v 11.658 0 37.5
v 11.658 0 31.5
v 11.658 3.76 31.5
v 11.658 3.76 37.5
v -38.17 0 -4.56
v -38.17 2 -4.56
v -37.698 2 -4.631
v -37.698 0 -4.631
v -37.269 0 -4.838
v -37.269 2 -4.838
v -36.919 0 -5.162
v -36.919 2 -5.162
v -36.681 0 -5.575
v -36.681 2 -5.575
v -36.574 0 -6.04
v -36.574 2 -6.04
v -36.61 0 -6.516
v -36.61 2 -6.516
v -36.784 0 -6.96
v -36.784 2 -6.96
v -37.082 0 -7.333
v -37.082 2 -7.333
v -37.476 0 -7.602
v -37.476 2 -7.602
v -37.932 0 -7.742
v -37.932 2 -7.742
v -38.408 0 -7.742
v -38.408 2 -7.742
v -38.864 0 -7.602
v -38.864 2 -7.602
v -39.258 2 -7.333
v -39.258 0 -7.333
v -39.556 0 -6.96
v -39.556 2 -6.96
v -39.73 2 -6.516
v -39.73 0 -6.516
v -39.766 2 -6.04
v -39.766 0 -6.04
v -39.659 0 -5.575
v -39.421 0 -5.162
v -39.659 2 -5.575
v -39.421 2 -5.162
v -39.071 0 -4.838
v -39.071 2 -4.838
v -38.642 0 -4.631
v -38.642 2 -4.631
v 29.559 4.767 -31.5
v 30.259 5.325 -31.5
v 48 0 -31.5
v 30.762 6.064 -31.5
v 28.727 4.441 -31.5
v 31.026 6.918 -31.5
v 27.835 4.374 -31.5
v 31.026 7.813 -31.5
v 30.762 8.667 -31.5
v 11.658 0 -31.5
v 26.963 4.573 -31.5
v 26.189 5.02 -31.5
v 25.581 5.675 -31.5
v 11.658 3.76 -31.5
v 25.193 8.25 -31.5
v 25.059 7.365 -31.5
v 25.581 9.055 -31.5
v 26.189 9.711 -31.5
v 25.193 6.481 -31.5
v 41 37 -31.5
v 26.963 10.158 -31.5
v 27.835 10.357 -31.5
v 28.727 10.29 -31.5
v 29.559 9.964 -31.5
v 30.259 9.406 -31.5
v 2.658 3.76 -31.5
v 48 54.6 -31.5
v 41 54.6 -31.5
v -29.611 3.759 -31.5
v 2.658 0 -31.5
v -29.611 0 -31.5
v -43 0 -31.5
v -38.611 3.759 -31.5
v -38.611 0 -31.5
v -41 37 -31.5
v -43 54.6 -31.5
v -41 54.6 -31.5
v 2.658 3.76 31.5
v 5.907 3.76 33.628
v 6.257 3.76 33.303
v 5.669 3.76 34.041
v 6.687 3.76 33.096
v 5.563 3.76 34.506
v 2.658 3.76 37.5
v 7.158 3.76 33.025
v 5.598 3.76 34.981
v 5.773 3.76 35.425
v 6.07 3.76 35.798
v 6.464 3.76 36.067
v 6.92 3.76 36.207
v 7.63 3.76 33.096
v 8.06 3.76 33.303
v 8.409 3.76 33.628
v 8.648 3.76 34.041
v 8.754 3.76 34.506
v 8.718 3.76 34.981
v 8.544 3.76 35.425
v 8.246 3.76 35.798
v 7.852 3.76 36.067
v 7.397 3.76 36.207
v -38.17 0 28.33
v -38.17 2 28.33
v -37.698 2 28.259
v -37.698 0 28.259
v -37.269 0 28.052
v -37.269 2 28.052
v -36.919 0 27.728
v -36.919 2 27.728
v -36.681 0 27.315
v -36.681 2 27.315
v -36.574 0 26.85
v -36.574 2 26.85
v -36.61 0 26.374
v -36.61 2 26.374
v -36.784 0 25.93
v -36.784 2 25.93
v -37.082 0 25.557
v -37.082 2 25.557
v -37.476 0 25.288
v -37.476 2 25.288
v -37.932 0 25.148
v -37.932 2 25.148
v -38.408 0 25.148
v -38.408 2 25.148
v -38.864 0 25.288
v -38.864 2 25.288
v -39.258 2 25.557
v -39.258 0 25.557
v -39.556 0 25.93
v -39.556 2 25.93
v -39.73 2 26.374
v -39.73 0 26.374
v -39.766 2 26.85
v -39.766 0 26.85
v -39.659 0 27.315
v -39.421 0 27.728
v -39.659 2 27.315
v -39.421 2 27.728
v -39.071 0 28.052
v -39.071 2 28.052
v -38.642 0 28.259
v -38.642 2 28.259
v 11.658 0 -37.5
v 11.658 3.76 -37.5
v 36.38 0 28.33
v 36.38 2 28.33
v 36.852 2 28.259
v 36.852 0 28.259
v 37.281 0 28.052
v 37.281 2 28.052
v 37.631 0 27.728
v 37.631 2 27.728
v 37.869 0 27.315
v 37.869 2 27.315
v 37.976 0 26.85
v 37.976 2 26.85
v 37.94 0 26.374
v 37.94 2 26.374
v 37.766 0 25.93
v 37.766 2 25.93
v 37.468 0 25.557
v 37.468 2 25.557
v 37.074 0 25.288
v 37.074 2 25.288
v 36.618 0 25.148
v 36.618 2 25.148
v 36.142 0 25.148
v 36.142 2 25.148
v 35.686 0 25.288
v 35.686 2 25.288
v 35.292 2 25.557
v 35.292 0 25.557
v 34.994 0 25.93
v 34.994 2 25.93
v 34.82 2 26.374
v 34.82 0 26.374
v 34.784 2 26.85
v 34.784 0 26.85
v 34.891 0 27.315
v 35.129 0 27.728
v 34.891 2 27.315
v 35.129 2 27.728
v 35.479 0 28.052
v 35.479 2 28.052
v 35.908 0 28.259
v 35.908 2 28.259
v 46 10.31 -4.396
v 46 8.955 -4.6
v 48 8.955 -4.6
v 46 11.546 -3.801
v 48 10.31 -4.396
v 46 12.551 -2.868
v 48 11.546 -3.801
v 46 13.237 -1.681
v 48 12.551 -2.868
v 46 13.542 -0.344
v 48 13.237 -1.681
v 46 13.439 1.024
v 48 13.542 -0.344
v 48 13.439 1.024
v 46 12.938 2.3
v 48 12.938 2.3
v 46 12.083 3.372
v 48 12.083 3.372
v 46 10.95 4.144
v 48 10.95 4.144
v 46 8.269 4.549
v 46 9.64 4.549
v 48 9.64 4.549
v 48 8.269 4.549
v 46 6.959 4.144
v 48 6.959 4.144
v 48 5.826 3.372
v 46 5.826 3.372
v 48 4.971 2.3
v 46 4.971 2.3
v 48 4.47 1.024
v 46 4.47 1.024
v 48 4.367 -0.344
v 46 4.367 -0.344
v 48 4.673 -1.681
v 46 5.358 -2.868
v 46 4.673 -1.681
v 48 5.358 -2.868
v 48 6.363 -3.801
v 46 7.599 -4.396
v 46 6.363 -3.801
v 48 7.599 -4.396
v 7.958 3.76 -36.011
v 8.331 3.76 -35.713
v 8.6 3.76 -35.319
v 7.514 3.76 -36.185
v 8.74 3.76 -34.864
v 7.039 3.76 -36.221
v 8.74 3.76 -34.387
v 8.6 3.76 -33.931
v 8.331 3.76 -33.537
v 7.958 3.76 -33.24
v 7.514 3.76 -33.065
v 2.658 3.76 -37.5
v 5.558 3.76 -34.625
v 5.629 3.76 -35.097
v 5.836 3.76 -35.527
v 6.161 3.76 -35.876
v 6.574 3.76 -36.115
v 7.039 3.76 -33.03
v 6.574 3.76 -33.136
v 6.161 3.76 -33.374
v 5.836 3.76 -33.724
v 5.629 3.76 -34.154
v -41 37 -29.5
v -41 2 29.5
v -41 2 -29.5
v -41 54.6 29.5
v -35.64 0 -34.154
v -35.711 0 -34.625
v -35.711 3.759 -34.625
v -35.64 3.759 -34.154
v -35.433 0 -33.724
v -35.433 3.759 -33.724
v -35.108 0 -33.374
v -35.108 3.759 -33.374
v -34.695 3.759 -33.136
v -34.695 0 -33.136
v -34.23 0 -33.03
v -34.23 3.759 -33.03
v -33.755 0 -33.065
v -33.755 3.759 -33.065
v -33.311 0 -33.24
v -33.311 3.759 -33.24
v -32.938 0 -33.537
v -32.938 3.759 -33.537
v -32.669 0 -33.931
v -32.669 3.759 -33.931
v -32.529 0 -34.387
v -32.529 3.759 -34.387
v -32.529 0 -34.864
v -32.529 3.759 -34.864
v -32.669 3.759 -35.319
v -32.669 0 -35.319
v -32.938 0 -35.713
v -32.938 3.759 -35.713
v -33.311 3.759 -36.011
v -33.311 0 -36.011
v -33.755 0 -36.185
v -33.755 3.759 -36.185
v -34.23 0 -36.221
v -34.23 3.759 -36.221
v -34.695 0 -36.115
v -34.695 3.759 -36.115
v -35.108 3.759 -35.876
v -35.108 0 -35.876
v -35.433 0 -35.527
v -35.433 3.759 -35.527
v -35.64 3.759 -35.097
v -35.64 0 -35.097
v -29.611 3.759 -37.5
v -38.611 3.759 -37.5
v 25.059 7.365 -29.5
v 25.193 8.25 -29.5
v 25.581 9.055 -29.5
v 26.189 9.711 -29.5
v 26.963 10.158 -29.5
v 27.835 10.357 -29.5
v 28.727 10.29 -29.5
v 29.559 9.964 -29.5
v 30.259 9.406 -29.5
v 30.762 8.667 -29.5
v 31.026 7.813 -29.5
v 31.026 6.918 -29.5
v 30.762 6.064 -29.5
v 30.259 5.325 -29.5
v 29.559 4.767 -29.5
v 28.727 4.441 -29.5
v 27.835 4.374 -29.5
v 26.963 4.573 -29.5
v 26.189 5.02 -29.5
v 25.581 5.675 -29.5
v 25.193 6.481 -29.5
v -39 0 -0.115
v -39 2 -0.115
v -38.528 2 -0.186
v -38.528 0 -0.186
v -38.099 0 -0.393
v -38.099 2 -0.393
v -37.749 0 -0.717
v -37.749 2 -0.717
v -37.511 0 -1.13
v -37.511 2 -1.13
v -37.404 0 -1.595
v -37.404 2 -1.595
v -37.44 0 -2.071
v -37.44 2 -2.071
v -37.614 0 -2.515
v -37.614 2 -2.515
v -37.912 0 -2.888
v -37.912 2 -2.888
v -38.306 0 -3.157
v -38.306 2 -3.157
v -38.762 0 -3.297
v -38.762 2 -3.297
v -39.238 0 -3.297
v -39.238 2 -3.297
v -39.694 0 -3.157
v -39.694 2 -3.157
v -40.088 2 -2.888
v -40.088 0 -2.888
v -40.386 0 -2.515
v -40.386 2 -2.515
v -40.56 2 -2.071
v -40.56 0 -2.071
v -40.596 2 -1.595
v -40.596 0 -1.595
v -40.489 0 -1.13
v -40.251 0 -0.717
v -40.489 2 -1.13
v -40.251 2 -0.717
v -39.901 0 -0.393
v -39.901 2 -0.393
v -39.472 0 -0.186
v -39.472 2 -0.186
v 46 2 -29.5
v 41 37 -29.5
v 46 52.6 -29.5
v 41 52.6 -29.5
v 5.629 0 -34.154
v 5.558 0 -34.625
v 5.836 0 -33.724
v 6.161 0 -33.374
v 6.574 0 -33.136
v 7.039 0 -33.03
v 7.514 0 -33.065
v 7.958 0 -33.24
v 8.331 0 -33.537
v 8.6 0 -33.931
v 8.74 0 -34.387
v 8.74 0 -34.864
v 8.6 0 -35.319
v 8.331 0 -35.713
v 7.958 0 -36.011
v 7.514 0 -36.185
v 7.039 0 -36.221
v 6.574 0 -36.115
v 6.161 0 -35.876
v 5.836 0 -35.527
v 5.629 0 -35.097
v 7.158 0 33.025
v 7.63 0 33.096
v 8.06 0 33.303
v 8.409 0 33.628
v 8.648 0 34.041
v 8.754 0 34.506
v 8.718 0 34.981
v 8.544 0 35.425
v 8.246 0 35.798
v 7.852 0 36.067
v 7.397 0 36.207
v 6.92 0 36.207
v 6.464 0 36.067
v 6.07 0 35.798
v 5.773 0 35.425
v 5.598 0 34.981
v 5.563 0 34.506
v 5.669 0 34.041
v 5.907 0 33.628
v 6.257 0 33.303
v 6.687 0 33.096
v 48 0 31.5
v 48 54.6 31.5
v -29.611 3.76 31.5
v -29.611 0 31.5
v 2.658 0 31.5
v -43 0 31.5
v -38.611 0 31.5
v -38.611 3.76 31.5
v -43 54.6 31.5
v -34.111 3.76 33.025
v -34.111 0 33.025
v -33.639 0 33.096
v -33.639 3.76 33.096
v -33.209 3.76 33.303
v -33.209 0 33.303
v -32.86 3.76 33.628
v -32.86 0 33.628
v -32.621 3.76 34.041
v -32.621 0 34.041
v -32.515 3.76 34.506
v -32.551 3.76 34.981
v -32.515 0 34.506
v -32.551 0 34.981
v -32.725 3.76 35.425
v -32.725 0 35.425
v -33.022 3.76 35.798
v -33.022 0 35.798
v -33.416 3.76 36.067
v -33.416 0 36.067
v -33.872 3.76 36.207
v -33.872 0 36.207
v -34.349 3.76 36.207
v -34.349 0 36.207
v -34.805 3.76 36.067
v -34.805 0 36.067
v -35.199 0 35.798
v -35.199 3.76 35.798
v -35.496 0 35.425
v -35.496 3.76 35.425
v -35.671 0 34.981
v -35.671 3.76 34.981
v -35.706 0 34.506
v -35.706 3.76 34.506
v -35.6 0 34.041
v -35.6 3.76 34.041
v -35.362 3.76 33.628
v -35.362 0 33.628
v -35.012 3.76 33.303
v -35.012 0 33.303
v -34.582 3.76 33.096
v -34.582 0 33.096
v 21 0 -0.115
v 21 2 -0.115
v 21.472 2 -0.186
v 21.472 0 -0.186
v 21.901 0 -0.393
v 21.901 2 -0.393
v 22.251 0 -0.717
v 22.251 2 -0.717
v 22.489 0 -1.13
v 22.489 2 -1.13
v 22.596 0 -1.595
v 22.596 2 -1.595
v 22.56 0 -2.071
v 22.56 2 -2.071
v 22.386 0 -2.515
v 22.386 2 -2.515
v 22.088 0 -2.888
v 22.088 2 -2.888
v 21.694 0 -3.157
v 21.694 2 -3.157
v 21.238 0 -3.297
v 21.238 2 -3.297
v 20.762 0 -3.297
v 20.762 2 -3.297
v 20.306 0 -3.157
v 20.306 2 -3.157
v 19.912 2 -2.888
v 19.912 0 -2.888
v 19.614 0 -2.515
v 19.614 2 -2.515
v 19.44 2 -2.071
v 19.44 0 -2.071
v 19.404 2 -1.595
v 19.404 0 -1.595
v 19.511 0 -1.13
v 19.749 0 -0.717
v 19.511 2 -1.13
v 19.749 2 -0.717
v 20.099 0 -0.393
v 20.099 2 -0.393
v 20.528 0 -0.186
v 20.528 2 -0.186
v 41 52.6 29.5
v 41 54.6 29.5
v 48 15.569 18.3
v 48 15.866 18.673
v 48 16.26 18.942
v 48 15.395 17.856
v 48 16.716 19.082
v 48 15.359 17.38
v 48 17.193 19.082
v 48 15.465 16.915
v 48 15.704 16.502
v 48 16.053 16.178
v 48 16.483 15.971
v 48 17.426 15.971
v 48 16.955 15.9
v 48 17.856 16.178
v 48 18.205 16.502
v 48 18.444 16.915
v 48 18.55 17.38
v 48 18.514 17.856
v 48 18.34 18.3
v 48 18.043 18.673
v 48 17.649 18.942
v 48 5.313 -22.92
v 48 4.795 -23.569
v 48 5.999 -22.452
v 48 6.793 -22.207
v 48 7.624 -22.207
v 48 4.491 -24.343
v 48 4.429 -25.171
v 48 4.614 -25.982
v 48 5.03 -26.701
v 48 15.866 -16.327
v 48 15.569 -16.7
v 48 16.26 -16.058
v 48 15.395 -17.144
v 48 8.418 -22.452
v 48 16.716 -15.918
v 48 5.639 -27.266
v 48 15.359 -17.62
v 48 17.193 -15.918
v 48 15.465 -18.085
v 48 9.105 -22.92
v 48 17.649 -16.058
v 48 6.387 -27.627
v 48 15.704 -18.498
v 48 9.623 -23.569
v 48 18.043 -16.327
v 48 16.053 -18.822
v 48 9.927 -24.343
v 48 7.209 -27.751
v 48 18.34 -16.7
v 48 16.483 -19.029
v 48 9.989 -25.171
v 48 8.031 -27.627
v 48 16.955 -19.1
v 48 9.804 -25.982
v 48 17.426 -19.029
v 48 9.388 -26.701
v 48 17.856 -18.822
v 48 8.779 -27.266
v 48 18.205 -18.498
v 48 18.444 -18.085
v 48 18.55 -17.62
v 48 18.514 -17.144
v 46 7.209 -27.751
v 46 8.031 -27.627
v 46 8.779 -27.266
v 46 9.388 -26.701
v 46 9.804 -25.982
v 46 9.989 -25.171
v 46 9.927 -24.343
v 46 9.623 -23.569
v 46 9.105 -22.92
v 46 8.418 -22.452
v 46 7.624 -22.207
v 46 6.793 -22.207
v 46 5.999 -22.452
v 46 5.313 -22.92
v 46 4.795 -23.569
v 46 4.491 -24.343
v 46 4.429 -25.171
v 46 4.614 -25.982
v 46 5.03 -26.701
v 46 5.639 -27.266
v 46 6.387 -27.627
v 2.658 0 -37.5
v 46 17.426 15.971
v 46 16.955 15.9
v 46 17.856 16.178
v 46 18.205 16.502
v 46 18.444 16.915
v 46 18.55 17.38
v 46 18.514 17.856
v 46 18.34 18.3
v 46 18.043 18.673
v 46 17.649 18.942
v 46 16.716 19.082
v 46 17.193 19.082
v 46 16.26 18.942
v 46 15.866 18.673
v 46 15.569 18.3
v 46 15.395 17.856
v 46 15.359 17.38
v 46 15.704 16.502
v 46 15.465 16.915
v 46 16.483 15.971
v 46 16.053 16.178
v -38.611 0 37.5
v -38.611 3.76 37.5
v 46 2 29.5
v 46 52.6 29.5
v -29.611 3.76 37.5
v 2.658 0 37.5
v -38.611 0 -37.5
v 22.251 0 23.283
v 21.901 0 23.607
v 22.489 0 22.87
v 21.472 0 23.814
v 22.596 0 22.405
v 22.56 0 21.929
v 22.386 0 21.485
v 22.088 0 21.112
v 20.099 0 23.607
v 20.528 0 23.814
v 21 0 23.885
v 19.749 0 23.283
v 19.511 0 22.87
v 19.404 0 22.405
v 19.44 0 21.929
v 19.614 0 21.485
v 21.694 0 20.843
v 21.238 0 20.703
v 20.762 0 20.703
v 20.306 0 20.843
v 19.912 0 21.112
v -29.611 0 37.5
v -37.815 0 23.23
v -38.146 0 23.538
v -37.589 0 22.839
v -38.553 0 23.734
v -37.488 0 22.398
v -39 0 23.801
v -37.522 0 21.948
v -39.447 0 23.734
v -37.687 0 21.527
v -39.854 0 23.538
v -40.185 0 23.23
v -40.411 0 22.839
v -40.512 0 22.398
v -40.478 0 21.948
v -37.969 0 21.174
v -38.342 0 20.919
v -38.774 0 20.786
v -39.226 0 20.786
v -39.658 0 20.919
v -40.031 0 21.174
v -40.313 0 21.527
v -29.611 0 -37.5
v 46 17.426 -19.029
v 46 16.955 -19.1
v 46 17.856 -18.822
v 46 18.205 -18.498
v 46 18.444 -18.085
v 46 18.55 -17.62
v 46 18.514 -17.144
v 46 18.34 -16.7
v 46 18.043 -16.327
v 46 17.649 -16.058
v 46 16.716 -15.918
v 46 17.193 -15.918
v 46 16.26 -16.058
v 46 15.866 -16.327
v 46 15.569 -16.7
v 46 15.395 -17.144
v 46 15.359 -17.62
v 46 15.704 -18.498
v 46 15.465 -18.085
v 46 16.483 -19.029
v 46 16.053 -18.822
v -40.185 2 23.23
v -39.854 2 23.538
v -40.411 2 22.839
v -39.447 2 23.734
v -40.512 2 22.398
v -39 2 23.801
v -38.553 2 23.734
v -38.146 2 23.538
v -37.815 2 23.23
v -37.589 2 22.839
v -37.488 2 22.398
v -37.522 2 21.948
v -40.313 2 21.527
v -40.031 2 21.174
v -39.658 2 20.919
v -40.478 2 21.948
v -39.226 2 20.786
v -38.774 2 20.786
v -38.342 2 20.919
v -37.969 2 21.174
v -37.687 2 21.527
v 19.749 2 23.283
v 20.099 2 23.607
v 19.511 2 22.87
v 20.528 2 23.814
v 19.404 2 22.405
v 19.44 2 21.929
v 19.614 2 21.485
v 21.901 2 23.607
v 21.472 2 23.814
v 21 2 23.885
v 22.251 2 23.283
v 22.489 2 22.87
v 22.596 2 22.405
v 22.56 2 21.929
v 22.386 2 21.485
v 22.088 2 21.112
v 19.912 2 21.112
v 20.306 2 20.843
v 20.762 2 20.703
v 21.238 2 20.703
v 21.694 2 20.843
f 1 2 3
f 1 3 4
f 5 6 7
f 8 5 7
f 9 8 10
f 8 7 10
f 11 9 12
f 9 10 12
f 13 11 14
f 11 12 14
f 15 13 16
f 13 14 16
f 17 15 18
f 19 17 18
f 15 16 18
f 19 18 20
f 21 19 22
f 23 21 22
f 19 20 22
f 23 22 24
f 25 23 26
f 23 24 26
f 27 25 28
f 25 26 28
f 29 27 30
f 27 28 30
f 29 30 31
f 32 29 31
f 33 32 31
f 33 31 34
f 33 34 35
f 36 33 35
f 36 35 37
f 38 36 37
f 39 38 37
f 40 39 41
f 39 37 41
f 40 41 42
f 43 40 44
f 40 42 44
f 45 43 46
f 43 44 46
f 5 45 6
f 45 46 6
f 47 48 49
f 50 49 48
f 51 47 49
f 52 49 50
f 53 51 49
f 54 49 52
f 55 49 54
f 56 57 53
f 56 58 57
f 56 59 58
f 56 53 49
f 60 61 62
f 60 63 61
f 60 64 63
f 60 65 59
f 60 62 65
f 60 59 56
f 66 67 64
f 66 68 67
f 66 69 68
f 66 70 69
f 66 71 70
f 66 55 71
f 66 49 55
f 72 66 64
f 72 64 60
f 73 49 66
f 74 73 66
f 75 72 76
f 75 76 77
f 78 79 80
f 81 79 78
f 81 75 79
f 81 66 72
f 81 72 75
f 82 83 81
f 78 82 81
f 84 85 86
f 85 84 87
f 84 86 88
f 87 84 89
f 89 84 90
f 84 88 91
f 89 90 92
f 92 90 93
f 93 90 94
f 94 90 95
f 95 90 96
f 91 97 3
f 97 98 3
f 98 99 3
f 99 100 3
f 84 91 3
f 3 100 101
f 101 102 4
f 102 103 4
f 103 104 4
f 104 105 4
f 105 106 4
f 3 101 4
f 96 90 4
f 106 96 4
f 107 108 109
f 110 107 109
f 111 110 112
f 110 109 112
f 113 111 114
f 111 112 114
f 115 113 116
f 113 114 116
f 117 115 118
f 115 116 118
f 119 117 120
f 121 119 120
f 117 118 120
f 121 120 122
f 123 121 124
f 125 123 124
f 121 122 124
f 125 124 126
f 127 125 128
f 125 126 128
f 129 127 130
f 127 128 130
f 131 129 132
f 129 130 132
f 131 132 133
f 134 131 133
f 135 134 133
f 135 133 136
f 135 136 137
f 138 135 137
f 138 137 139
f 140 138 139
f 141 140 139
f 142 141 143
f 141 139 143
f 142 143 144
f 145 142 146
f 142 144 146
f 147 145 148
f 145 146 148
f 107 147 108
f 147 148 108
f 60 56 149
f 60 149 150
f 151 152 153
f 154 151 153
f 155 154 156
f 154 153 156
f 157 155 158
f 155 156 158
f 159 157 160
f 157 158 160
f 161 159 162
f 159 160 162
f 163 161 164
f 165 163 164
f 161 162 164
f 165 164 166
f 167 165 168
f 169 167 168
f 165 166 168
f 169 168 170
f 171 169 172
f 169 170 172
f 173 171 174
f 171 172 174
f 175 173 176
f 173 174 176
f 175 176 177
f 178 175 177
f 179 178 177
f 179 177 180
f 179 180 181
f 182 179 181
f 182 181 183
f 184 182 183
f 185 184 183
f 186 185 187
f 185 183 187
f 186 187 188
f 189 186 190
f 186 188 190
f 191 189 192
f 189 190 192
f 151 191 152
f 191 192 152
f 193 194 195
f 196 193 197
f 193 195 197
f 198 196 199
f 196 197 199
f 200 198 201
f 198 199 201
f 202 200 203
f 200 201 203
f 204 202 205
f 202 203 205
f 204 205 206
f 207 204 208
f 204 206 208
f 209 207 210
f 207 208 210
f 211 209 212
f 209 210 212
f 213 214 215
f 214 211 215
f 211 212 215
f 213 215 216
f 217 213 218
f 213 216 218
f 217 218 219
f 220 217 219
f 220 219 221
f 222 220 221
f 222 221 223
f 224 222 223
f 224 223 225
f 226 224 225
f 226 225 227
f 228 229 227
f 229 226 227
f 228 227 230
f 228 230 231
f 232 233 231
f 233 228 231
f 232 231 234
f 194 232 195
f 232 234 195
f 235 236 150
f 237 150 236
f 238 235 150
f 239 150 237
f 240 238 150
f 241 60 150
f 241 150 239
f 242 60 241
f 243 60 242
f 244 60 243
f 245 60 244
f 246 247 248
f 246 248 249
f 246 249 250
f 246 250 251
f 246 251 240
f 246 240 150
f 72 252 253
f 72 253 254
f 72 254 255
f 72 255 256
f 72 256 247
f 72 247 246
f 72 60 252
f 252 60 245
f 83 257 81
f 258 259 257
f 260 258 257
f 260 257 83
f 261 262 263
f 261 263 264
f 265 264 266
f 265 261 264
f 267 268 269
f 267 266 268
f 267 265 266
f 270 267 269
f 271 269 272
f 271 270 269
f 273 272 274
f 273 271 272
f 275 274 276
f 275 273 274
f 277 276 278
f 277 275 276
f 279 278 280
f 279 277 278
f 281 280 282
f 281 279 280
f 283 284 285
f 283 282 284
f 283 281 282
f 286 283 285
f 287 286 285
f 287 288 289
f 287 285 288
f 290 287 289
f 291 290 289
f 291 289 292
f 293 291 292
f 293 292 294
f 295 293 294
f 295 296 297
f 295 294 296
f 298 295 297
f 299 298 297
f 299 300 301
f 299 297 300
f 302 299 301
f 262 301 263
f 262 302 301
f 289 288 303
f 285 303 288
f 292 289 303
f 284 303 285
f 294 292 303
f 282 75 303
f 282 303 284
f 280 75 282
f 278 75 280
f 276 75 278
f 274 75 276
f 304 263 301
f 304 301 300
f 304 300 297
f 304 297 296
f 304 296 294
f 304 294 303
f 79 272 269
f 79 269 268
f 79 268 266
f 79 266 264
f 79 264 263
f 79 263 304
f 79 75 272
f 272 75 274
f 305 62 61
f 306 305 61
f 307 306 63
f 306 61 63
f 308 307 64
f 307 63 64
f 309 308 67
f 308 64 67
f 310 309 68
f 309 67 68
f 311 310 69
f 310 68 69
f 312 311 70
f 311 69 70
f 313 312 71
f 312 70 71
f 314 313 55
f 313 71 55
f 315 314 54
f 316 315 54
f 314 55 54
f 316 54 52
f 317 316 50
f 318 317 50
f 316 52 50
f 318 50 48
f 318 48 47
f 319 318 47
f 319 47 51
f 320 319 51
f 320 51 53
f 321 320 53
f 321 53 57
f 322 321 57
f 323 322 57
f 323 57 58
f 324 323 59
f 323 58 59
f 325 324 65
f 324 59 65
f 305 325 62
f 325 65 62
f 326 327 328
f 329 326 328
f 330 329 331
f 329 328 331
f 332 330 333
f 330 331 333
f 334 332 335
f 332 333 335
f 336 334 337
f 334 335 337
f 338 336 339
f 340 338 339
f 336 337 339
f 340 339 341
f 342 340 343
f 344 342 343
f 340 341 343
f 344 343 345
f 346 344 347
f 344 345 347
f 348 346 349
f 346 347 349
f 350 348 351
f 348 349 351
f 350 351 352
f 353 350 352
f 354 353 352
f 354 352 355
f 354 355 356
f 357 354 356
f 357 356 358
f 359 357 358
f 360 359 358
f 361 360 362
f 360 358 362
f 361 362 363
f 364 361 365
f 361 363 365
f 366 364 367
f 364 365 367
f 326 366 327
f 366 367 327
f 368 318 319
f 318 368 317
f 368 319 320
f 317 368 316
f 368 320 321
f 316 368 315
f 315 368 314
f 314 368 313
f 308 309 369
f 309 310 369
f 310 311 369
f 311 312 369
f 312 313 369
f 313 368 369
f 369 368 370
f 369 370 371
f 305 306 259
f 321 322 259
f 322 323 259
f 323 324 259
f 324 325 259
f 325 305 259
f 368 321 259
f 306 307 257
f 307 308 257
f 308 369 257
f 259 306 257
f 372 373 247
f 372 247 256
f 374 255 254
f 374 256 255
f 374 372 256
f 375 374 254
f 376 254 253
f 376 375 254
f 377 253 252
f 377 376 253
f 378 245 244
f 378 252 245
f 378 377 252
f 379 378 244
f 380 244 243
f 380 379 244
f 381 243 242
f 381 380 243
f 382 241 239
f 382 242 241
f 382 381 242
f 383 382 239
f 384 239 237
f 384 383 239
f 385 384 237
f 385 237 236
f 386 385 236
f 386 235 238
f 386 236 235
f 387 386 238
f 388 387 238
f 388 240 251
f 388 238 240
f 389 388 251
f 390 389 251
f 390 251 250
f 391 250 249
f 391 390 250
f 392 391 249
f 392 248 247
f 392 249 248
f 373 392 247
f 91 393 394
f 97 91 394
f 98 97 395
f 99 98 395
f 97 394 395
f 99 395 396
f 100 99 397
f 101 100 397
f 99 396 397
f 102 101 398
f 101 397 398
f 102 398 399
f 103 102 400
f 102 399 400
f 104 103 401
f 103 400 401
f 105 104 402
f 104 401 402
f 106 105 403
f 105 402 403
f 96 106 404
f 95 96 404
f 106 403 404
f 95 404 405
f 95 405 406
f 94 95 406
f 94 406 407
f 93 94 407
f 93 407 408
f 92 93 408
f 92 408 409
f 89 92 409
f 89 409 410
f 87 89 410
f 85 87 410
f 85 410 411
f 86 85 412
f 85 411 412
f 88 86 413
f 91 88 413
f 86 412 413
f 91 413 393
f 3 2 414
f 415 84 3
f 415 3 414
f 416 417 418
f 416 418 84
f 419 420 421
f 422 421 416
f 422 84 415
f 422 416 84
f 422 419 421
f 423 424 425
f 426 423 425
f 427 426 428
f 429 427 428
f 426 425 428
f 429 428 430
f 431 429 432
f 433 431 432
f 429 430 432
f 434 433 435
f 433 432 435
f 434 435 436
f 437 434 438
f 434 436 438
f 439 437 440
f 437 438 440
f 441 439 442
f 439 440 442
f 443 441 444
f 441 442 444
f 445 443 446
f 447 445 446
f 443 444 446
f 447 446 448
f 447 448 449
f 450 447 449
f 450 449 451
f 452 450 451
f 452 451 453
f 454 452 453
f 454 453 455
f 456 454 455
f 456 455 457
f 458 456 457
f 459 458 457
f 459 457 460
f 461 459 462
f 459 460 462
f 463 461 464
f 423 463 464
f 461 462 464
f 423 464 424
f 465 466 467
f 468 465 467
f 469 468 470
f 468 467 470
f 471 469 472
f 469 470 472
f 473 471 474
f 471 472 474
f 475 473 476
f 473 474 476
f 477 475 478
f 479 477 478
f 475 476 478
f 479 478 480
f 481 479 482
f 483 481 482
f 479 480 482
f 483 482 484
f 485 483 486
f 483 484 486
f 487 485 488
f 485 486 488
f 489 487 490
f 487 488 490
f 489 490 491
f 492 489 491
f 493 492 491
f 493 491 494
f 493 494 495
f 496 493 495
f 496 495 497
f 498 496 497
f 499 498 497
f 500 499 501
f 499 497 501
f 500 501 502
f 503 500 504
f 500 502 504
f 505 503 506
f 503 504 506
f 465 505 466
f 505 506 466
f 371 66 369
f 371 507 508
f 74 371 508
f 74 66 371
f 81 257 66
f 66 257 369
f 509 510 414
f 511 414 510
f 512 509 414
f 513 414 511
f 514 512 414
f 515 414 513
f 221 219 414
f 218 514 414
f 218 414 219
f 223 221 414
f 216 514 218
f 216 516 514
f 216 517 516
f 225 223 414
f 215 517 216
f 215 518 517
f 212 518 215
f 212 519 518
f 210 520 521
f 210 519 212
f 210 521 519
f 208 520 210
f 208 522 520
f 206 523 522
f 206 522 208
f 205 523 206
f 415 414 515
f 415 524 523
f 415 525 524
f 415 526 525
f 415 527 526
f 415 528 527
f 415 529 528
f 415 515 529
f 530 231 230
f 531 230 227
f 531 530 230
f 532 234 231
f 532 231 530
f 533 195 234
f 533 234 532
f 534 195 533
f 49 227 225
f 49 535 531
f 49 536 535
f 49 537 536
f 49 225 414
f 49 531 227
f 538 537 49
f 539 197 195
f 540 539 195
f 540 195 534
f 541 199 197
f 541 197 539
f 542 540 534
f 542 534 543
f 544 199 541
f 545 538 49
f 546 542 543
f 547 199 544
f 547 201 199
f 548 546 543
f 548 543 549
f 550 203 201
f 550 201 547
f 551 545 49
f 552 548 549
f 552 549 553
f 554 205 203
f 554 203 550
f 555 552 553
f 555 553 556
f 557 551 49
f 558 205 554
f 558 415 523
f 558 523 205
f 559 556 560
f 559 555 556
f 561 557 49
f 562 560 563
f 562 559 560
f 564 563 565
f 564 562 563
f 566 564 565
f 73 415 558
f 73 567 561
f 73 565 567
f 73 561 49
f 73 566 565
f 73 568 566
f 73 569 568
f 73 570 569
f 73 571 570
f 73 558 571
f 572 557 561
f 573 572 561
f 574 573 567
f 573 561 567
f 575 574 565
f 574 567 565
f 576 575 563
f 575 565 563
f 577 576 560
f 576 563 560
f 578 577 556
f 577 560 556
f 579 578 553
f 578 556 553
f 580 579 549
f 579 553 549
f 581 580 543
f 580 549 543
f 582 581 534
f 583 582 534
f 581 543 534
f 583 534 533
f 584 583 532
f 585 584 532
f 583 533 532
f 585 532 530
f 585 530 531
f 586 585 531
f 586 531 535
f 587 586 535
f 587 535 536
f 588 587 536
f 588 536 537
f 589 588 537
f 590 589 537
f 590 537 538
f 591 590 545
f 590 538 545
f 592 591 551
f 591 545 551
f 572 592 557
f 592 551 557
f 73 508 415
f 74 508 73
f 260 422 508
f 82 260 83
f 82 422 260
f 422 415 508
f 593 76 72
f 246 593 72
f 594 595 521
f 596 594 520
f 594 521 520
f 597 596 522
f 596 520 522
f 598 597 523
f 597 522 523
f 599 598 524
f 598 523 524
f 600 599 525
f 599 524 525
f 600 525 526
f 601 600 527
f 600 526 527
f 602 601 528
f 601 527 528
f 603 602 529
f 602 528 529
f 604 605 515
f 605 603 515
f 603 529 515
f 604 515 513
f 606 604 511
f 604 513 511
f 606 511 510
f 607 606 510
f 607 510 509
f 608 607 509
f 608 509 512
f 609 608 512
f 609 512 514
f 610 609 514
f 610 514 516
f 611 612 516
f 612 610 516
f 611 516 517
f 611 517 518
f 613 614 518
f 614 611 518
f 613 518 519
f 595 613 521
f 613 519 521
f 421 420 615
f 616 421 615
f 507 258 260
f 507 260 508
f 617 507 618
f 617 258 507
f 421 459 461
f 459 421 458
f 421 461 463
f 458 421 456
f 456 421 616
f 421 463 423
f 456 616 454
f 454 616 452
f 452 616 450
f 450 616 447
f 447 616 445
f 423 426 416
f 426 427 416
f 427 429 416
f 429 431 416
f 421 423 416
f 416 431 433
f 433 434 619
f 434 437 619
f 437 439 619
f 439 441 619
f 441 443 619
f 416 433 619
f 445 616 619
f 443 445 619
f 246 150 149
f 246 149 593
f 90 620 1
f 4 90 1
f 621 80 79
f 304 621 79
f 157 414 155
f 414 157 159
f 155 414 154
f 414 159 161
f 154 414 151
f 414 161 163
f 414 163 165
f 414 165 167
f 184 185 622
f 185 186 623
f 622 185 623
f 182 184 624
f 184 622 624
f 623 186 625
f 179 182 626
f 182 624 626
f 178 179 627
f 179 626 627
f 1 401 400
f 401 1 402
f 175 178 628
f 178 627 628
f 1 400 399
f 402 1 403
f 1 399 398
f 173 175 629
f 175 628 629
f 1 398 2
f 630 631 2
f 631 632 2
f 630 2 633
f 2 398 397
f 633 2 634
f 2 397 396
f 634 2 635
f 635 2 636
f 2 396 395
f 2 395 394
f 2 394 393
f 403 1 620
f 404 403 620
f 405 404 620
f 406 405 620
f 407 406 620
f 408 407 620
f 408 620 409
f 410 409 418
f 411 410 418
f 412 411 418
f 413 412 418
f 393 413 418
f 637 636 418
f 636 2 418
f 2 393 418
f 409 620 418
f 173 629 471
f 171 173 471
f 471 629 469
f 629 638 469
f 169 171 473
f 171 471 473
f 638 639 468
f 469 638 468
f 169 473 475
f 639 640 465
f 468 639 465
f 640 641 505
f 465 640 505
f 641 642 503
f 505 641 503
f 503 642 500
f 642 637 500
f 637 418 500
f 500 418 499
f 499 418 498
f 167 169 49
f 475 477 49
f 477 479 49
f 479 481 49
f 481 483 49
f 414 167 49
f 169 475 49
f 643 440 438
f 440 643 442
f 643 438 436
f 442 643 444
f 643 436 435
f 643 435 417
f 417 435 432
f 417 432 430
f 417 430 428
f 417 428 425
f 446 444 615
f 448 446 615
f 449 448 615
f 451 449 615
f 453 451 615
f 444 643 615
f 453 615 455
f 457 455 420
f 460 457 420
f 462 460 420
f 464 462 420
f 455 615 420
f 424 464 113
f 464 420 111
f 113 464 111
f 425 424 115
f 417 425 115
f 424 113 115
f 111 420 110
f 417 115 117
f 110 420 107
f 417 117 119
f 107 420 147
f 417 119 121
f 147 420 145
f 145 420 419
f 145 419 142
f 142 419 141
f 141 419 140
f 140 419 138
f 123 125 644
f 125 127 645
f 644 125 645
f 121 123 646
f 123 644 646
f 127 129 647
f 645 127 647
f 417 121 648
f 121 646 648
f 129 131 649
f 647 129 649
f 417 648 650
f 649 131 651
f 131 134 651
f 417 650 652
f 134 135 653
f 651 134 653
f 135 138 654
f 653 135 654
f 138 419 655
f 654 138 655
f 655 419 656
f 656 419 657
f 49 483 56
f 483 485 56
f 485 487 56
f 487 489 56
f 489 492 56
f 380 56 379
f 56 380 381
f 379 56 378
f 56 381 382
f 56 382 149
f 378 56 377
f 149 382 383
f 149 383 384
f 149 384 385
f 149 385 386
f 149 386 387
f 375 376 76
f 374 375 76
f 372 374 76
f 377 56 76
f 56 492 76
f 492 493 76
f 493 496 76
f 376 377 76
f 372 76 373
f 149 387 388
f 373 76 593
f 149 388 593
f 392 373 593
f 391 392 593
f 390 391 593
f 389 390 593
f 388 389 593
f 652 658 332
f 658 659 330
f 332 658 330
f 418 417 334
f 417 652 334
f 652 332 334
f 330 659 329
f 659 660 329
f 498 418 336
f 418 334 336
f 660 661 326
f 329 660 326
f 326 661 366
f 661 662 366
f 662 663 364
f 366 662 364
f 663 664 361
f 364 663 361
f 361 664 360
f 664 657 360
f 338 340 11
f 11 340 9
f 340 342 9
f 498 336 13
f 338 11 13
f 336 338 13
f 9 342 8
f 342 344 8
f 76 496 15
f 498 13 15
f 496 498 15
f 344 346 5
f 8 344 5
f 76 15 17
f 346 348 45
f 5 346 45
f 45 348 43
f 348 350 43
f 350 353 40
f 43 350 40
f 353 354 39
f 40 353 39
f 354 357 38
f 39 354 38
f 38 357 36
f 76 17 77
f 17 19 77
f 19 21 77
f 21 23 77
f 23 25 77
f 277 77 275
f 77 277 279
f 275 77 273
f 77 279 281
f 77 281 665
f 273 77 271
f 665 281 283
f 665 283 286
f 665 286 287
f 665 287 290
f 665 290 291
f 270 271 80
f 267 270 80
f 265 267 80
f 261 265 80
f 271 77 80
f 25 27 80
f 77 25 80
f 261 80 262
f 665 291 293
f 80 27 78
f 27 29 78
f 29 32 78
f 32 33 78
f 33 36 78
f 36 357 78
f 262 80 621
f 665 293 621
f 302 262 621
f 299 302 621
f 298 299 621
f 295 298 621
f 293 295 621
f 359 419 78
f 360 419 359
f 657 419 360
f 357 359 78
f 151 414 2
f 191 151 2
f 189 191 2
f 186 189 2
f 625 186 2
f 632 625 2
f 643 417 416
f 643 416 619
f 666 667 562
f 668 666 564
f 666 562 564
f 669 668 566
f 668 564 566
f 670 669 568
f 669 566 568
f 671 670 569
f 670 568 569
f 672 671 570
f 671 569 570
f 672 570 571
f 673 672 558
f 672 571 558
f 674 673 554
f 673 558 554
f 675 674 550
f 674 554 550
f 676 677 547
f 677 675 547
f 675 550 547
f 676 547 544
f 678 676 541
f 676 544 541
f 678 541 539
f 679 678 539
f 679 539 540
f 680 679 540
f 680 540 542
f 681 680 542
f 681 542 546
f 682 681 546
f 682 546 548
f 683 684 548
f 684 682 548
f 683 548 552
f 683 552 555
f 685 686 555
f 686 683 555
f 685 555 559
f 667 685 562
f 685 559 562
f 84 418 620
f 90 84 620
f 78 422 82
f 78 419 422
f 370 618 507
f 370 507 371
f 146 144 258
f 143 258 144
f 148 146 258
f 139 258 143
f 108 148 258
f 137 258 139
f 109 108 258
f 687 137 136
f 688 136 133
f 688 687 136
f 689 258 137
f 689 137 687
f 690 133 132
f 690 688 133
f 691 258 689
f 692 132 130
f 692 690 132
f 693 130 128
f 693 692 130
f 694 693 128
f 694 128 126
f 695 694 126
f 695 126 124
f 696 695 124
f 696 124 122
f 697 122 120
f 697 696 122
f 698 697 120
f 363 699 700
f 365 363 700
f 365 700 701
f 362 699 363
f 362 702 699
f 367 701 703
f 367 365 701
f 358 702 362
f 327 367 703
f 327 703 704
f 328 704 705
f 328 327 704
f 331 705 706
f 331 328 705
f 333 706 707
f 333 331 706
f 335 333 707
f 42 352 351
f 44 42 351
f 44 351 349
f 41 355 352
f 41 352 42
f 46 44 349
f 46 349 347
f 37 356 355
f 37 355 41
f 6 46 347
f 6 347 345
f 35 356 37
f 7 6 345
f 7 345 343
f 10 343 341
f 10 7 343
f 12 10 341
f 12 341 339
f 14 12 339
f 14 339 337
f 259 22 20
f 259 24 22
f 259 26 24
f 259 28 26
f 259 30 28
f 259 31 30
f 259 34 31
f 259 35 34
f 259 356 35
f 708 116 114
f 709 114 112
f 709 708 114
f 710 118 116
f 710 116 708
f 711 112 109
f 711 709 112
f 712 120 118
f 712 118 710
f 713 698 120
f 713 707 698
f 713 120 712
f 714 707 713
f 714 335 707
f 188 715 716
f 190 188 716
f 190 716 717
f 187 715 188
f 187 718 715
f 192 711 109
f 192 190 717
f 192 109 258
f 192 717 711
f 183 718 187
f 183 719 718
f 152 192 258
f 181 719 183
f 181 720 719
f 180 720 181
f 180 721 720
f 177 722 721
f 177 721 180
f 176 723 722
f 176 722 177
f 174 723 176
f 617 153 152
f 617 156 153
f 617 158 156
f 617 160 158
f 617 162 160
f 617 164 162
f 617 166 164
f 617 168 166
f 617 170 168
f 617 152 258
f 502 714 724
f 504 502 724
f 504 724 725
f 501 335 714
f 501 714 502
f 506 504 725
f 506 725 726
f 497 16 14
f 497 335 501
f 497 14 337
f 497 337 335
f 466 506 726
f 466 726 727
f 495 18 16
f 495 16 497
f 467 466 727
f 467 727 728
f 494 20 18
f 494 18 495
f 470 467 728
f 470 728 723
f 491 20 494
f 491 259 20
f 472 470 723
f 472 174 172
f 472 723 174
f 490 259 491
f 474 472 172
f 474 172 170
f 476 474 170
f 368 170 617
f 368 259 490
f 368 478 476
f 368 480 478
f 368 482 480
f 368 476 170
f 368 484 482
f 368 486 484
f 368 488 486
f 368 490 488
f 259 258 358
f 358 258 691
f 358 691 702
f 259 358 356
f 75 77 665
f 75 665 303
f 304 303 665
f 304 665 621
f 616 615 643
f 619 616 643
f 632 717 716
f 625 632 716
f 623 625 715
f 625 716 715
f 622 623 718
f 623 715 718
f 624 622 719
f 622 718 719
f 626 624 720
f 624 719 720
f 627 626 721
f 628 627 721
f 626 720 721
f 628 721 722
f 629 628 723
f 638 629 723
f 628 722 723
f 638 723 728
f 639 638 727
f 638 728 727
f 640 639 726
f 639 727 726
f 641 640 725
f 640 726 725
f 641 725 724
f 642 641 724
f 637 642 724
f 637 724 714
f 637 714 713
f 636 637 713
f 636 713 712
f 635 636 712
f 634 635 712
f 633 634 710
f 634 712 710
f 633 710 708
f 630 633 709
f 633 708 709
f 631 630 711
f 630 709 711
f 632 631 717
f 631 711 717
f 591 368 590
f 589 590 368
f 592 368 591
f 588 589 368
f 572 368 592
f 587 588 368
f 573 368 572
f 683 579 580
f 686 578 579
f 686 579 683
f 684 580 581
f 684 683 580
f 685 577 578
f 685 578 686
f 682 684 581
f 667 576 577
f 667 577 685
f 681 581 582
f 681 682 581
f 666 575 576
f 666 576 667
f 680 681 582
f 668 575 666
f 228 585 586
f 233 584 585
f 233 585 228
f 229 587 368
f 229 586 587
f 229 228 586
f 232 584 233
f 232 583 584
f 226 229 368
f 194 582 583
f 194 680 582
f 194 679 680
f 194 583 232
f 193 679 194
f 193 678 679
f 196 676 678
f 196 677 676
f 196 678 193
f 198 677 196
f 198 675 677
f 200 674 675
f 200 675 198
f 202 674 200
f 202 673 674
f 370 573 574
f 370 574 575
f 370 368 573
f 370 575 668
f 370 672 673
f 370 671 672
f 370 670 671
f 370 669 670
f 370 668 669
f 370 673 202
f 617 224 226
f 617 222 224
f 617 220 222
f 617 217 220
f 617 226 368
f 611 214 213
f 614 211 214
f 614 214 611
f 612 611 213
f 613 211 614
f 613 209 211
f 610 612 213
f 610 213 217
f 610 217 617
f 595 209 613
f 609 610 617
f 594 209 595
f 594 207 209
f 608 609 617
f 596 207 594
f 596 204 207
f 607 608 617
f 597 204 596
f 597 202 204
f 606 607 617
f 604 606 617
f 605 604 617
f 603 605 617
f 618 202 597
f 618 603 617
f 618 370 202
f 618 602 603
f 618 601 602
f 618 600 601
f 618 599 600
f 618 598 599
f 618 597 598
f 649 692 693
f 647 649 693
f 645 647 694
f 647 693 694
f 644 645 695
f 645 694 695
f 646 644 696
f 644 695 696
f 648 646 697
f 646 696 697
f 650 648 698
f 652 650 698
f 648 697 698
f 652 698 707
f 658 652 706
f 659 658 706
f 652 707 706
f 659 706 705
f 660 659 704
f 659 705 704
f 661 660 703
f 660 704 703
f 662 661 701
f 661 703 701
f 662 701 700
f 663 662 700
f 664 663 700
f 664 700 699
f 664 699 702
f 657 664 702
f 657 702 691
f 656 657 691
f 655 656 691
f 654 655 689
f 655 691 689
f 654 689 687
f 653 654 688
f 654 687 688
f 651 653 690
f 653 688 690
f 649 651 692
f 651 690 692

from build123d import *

# Parameters (mm, degrees)
SKETCH_1_W                = 86
SKETCH_1_H                = 63
EXTRUDE_1_DEPTH           = 2
SKETCH_2_W                = 86
SKETCH_2_H                = 63
SKETCH_2_W_2              = 82
SKETCH_2_H_2              = 59
EXTRUDE_3_DEPTH           = 52.6
SKETCH_4_W                = 82
SKETCH_4_H                = 17.6
CUT_EXTRUDE_1_DEPTH       = 52.6
SKETCH_5_R                = 1.6
SKETCH_5_R_2              = 4.6
CUT_EXTRUDE_2_DEPTH       = 2
SKETCH_7_R                = 1.6
CUT_EXTRUDE_6_DEPTH       = 2
SKETCH_8_R                = 1.6
SKETCH_8_R_2              = 1.516132991
CUT_EXTRUDE_7_DEPTH       = 2
SKETCH_9_W                = 63
SKETCH_9_H                = 54.6
EXTRUDE_4_DEPTH           = 5
SKETCH_10_R               = 1.6
SKETCH_10_R_2             = 4.6
CUT_EXTRUDE_8_DEPTH       = 5
CUT_EXTRUDE_START         = -5
SKETCH_11_R               = 1.6
SKETCH_11_R_2             = 4.6
CUT_EXTRUDE_9_DEPTH       = 5
SKETCH_12_W               = 5
SKETCH_12_H               = 15.6
EXTRUDE_5_DEPTH           = 2
SKETCH_13_R               = 2.787491564
CUT_EXTRUDE_10_DEPTH      = 2
SKETCH_14_R               = 3
CUT_EXTRUDE_11_DEPTH      = 2
SKETCH_16_W               = 9
SKETCH_16_H               = 3.75891244
SKETCH_16_H_2             = 3.76
EXTRUDE_6_DEPTH           = 6
CUT_EXTRUDE_15_DEPTH      = 80.341453127
CUT_EXTRUDE_15_DEPTH_BACK = 80.341453127
SKETCH_17_R               = 1.6
SKETCH_18_W               = 9
SKETCH_18_H               = 6
SKETCH_18_R               = 1.6
EXTRUDE_7_DEPTH           = 3.76


with BuildPart() as part:
    # 草图1 → 凸台-拉伸1 (new body)
    with BuildSketch(Plane(origin=(0, 0, 0), x_dir=(1, 0, 0), z_dir=(0, 1, 0))):
        Rectangle(SKETCH_1_W, SKETCH_1_H)
    extrude(amount=EXTRUDE_1_DEPTH)

    # 草图2 → 凸台-拉伸3 (add)
    with BuildSketch(Plane(origin=(0, 2, 0), x_dir=(1, 0, 0), z_dir=(0, 1, 0))):
        Rectangle(SKETCH_2_W, SKETCH_2_H)
        Rectangle(SKETCH_2_W_2, SKETCH_2_H_2, mode=Mode.SUBTRACT)
    extrude(amount=EXTRUDE_3_DEPTH)

    # 草图4 → 切除-拉伸1 (cut)
    with BuildSketch(Plane.XY.offset(-29.5)):
        with Locations((0, 45.8)):
            Rectangle(SKETCH_4_W, SKETCH_4_H)
    extrude(amount=-CUT_EXTRUDE_1_DEPTH, mode=Mode.SUBTRACT)

    # 草图5 → 切除-拉伸2 (cut)
    with BuildSketch(Plane(origin=(43, 0, 0), x_dir=(0, 0, -1), z_dir=(1, 0, 0))):
        with Locations((-17.5, 16.95452537)):
            Circle(SKETCH_5_R)
        with Locations((17.5, 16.95452537)):
            Circle(SKETCH_5_R)
        with Locations((0, 8.95452537)):
            Circle(SKETCH_5_R_2)
    extrude(amount=-CUT_EXTRUDE_2_DEPTH, mode=Mode.SUBTRACT)

    # 草图7 → 切除-拉伸6 (cut)
    with BuildSketch(Plane(origin=(0, 2, 0), x_dir=(1, 0, 0), z_dir=(0, 1, 0))):
        with Locations(Location((-38.17, 6.16, 0), (0, 0, 270))):
            Circle(SKETCH_7_R)
        with Locations(Location((-38.17, -26.73, 0), (0, 0, 270))):
            Circle(SKETCH_7_R)
        with Locations(Location((36.38, -26.73, 0), (0, 0, 270))):
            Circle(SKETCH_7_R)
    extrude(amount=-CUT_EXTRUDE_6_DEPTH, mode=Mode.SUBTRACT)

    # 草图8 → 切除-拉伸7 (cut)
    with BuildSketch(Plane(origin=(0, 2, 0), x_dir=(1, 0, 0), z_dir=(0, 1, 0))):
        with Locations(Location((-39, 1.715, 0), (0, 0, 270))):
            Circle(SKETCH_8_R)
        with Locations(Location((21, -22.285, 0), (0, 0, 270))):
            Circle(SKETCH_8_R)
        with Locations(Location((-39, -22.285, 0), (0, 0, 270))):
            Circle(SKETCH_8_R_2)
        with Locations(Location((21, 1.715, 0), (0, 0, 270))):
            Circle(SKETCH_8_R)
    extrude(amount=-CUT_EXTRUDE_7_DEPTH, mode=Mode.SUBTRACT)

    # 草图9 → 凸台-拉伸4 (add)
    with BuildSketch(Plane(origin=(43, 0, 0), x_dir=(0, 0, -1), z_dir=(1, 0, 0))):
        with Locations((0, 27.3)):
            Rectangle(SKETCH_9_W, SKETCH_9_H)
    extrude(amount=EXTRUDE_4_DEPTH)

    # 草图10 → 切除-拉伸8 (cut)
    with BuildSketch(Plane(origin=(48, 0, 0), x_dir=(0, 0, -1), z_dir=(1, 0, 0))):
        with Locations((-17.5, 16.95452537)):
            Circle(SKETCH_10_R)
        with Locations((0, 8.95452537)):
            Circle(SKETCH_10_R_2)
        with Locations((17.5, 16.95452537)):
            Circle(SKETCH_10_R)
    extrude(amount=-CUT_EXTRUDE_8_DEPTH, mode=Mode.SUBTRACT)

    # 草图11 → 切除-拉伸9 (cut)
    with BuildSketch(Plane.ZY.offset(-41).offset(CUT_EXTRUDE_START)):
        Polygon((29.5, 52.6), (-31.5, 52.6), (-31.5, 37), (-29.5, 37), (-29.5, 2), (29.5, 2), align=None)
        with Locations(Location((-17.5, 16.95452537, 0), (0, 0, 180))):
            Circle(SKETCH_11_R, mode=Mode.SUBTRACT)
        with Locations(Location((0, 8.95452537, 0), (0, 0, 180))):
            Circle(SKETCH_11_R_2, mode=Mode.SUBTRACT)
        with Locations(Location((17.5, 16.95452537, 0), (0, 0, 180))):
            Circle(SKETCH_11_R, mode=Mode.SUBTRACT)
    extrude(amount=CUT_EXTRUDE_9_DEPTH, mode=Mode.SUBTRACT)

    # 草图12 → 凸台-拉伸5 (add)
    with BuildSketch(Plane(origin=(0, 0, -31.5), x_dir=(-1, 0, 0), z_dir=(0, 0, -1))):
        with Locations((-43.5, 44.8)):
            Rectangle(SKETCH_12_W, SKETCH_12_H)
    extrude(amount=-EXTRUDE_5_DEPTH)

    # 草图13 → 切除-拉伸10 (cut)
    with BuildSketch(Plane(origin=(48, 0, 0), x_dir=(0, 0, -1), z_dir=(1, 0, 0))):
        with Locations((24.963130904, 7.208902204)):
            Circle(SKETCH_13_R)
    extrude(amount=-CUT_EXTRUDE_10_DEPTH, mode=Mode.SUBTRACT)

    # 草图14 → 切除-拉伸11 (cut)
    with BuildSketch(Plane(origin=(0, 0, -31.5), x_dir=(-1, 0, 0), z_dir=(0, 0, -1))):
        with Locations((-28.059363277, 7.365425106)):
            Circle(SKETCH_14_R)
    extrude(amount=-CUT_EXTRUDE_11_DEPTH, mode=Mode.SUBTRACT)

    # 草图16 → 凸台-拉伸6 (add)
    with BuildSketch(Plane(origin=(0, 0, -31.5), x_dir=(-1, 0, 0), z_dir=(0, 0, -1))):
        with Locations((34.110668407, 1.87945622)):
            Rectangle(SKETCH_16_W, SKETCH_16_H)
        with Locations((-7.158197826, 1.88)):
            Rectangle(SKETCH_16_W, SKETCH_16_H_2)
    extrude(amount=EXTRUDE_6_DEPTH)

    # 草图17 → 切除-拉伸15 (cut, two sides: drawn at the far end of the back side and taken through both)
    with BuildSketch(Plane(origin=(0, 3.75891244, 0), x_dir=(1, 0, 0), z_dir=(0, 1, 0)).offset(-CUT_EXTRUDE_15_DEPTH_BACK)):
        with Locations(Location((-34.110668407, 34.625200871, 0), (0, 0, 180))):
            Circle(SKETCH_17_R)
        with Locations(Location((7.158197826, 34.625200871, 0), (0, 0, 180))):
            Circle(SKETCH_17_R)
    extrude(amount=CUT_EXTRUDE_15_DEPTH + CUT_EXTRUDE_15_DEPTH_BACK, mode=Mode.SUBTRACT)

    # 草图18 → 凸台-拉伸7 (add)
    # profile 1 of 2: a face of its own
    with BuildSketch(Plane.XZ):
        with Locations((7.158197826, 34.5)):
            Rectangle(SKETCH_18_W, SKETCH_18_H)
        with Locations(Location((7.158197826, 34.625200871, 0), (0, 0, 270))):
            Circle(SKETCH_18_R, mode=Mode.SUBTRACT)
    # profile 2 of 2: a face of its own
    with BuildSketch(Plane.XZ):
        with Locations((-34.110668407, 34.5)):
            Rectangle(SKETCH_18_W, SKETCH_18_H)
        with Locations(Location((-34.110668407, 34.625200871, 0), (0, 0, 270))):
            Circle(SKETCH_18_R, mode=Mode.SUBTRACT)
    extrude(amount=-EXTRUDE_7_DEPTH)


solid = part.part
